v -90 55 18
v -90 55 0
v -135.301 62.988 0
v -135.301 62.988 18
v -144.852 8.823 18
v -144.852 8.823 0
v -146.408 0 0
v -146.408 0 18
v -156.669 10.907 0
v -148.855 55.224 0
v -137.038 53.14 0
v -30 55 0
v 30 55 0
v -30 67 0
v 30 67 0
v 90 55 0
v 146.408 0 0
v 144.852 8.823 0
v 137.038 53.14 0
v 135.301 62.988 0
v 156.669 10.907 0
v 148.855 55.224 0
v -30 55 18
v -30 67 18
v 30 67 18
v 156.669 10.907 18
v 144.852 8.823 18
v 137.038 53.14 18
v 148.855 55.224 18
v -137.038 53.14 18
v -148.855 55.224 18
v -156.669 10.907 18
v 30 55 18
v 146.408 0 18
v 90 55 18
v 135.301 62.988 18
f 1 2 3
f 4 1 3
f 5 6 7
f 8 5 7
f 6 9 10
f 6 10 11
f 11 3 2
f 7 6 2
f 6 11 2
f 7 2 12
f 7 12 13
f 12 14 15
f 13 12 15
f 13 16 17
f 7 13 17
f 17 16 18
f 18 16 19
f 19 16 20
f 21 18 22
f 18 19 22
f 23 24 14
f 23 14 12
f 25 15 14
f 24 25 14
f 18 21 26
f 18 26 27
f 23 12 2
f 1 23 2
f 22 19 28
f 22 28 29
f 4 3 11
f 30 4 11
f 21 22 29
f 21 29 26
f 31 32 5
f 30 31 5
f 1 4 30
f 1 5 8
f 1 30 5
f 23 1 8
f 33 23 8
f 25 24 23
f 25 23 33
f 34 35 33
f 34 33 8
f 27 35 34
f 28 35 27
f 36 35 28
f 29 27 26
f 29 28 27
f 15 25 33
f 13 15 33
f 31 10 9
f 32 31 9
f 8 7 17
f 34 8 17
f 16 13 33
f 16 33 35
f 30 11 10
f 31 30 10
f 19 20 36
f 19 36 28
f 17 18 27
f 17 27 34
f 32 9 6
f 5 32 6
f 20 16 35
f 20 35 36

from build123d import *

# Parameters (mm, degrees)
PAD_DEPTH = 18


with BuildPart() as part:
    # Sketch → Pad (new body)
    with BuildSketch(Plane.XY):
        Polygon((0, 67), (30, 67), (30, 55), (90, 55), (135.301157, 62.987816), (137.037638, 53.139739), (148.855331, 55.223517), (156.669499, 10.907168), (144.851806, 8.82339), (146.407608, 0), (0, 0), align=None)
    pad = extrude(amount=PAD_DEPTH)

    # Mirrored: Pad across Sketch V_Axis
    add(pad.mirror(Plane(origin=(0, 0, 0), x_dir=(0, 0, 1), z_dir=(1, 0, 0))))


solid = part.part
